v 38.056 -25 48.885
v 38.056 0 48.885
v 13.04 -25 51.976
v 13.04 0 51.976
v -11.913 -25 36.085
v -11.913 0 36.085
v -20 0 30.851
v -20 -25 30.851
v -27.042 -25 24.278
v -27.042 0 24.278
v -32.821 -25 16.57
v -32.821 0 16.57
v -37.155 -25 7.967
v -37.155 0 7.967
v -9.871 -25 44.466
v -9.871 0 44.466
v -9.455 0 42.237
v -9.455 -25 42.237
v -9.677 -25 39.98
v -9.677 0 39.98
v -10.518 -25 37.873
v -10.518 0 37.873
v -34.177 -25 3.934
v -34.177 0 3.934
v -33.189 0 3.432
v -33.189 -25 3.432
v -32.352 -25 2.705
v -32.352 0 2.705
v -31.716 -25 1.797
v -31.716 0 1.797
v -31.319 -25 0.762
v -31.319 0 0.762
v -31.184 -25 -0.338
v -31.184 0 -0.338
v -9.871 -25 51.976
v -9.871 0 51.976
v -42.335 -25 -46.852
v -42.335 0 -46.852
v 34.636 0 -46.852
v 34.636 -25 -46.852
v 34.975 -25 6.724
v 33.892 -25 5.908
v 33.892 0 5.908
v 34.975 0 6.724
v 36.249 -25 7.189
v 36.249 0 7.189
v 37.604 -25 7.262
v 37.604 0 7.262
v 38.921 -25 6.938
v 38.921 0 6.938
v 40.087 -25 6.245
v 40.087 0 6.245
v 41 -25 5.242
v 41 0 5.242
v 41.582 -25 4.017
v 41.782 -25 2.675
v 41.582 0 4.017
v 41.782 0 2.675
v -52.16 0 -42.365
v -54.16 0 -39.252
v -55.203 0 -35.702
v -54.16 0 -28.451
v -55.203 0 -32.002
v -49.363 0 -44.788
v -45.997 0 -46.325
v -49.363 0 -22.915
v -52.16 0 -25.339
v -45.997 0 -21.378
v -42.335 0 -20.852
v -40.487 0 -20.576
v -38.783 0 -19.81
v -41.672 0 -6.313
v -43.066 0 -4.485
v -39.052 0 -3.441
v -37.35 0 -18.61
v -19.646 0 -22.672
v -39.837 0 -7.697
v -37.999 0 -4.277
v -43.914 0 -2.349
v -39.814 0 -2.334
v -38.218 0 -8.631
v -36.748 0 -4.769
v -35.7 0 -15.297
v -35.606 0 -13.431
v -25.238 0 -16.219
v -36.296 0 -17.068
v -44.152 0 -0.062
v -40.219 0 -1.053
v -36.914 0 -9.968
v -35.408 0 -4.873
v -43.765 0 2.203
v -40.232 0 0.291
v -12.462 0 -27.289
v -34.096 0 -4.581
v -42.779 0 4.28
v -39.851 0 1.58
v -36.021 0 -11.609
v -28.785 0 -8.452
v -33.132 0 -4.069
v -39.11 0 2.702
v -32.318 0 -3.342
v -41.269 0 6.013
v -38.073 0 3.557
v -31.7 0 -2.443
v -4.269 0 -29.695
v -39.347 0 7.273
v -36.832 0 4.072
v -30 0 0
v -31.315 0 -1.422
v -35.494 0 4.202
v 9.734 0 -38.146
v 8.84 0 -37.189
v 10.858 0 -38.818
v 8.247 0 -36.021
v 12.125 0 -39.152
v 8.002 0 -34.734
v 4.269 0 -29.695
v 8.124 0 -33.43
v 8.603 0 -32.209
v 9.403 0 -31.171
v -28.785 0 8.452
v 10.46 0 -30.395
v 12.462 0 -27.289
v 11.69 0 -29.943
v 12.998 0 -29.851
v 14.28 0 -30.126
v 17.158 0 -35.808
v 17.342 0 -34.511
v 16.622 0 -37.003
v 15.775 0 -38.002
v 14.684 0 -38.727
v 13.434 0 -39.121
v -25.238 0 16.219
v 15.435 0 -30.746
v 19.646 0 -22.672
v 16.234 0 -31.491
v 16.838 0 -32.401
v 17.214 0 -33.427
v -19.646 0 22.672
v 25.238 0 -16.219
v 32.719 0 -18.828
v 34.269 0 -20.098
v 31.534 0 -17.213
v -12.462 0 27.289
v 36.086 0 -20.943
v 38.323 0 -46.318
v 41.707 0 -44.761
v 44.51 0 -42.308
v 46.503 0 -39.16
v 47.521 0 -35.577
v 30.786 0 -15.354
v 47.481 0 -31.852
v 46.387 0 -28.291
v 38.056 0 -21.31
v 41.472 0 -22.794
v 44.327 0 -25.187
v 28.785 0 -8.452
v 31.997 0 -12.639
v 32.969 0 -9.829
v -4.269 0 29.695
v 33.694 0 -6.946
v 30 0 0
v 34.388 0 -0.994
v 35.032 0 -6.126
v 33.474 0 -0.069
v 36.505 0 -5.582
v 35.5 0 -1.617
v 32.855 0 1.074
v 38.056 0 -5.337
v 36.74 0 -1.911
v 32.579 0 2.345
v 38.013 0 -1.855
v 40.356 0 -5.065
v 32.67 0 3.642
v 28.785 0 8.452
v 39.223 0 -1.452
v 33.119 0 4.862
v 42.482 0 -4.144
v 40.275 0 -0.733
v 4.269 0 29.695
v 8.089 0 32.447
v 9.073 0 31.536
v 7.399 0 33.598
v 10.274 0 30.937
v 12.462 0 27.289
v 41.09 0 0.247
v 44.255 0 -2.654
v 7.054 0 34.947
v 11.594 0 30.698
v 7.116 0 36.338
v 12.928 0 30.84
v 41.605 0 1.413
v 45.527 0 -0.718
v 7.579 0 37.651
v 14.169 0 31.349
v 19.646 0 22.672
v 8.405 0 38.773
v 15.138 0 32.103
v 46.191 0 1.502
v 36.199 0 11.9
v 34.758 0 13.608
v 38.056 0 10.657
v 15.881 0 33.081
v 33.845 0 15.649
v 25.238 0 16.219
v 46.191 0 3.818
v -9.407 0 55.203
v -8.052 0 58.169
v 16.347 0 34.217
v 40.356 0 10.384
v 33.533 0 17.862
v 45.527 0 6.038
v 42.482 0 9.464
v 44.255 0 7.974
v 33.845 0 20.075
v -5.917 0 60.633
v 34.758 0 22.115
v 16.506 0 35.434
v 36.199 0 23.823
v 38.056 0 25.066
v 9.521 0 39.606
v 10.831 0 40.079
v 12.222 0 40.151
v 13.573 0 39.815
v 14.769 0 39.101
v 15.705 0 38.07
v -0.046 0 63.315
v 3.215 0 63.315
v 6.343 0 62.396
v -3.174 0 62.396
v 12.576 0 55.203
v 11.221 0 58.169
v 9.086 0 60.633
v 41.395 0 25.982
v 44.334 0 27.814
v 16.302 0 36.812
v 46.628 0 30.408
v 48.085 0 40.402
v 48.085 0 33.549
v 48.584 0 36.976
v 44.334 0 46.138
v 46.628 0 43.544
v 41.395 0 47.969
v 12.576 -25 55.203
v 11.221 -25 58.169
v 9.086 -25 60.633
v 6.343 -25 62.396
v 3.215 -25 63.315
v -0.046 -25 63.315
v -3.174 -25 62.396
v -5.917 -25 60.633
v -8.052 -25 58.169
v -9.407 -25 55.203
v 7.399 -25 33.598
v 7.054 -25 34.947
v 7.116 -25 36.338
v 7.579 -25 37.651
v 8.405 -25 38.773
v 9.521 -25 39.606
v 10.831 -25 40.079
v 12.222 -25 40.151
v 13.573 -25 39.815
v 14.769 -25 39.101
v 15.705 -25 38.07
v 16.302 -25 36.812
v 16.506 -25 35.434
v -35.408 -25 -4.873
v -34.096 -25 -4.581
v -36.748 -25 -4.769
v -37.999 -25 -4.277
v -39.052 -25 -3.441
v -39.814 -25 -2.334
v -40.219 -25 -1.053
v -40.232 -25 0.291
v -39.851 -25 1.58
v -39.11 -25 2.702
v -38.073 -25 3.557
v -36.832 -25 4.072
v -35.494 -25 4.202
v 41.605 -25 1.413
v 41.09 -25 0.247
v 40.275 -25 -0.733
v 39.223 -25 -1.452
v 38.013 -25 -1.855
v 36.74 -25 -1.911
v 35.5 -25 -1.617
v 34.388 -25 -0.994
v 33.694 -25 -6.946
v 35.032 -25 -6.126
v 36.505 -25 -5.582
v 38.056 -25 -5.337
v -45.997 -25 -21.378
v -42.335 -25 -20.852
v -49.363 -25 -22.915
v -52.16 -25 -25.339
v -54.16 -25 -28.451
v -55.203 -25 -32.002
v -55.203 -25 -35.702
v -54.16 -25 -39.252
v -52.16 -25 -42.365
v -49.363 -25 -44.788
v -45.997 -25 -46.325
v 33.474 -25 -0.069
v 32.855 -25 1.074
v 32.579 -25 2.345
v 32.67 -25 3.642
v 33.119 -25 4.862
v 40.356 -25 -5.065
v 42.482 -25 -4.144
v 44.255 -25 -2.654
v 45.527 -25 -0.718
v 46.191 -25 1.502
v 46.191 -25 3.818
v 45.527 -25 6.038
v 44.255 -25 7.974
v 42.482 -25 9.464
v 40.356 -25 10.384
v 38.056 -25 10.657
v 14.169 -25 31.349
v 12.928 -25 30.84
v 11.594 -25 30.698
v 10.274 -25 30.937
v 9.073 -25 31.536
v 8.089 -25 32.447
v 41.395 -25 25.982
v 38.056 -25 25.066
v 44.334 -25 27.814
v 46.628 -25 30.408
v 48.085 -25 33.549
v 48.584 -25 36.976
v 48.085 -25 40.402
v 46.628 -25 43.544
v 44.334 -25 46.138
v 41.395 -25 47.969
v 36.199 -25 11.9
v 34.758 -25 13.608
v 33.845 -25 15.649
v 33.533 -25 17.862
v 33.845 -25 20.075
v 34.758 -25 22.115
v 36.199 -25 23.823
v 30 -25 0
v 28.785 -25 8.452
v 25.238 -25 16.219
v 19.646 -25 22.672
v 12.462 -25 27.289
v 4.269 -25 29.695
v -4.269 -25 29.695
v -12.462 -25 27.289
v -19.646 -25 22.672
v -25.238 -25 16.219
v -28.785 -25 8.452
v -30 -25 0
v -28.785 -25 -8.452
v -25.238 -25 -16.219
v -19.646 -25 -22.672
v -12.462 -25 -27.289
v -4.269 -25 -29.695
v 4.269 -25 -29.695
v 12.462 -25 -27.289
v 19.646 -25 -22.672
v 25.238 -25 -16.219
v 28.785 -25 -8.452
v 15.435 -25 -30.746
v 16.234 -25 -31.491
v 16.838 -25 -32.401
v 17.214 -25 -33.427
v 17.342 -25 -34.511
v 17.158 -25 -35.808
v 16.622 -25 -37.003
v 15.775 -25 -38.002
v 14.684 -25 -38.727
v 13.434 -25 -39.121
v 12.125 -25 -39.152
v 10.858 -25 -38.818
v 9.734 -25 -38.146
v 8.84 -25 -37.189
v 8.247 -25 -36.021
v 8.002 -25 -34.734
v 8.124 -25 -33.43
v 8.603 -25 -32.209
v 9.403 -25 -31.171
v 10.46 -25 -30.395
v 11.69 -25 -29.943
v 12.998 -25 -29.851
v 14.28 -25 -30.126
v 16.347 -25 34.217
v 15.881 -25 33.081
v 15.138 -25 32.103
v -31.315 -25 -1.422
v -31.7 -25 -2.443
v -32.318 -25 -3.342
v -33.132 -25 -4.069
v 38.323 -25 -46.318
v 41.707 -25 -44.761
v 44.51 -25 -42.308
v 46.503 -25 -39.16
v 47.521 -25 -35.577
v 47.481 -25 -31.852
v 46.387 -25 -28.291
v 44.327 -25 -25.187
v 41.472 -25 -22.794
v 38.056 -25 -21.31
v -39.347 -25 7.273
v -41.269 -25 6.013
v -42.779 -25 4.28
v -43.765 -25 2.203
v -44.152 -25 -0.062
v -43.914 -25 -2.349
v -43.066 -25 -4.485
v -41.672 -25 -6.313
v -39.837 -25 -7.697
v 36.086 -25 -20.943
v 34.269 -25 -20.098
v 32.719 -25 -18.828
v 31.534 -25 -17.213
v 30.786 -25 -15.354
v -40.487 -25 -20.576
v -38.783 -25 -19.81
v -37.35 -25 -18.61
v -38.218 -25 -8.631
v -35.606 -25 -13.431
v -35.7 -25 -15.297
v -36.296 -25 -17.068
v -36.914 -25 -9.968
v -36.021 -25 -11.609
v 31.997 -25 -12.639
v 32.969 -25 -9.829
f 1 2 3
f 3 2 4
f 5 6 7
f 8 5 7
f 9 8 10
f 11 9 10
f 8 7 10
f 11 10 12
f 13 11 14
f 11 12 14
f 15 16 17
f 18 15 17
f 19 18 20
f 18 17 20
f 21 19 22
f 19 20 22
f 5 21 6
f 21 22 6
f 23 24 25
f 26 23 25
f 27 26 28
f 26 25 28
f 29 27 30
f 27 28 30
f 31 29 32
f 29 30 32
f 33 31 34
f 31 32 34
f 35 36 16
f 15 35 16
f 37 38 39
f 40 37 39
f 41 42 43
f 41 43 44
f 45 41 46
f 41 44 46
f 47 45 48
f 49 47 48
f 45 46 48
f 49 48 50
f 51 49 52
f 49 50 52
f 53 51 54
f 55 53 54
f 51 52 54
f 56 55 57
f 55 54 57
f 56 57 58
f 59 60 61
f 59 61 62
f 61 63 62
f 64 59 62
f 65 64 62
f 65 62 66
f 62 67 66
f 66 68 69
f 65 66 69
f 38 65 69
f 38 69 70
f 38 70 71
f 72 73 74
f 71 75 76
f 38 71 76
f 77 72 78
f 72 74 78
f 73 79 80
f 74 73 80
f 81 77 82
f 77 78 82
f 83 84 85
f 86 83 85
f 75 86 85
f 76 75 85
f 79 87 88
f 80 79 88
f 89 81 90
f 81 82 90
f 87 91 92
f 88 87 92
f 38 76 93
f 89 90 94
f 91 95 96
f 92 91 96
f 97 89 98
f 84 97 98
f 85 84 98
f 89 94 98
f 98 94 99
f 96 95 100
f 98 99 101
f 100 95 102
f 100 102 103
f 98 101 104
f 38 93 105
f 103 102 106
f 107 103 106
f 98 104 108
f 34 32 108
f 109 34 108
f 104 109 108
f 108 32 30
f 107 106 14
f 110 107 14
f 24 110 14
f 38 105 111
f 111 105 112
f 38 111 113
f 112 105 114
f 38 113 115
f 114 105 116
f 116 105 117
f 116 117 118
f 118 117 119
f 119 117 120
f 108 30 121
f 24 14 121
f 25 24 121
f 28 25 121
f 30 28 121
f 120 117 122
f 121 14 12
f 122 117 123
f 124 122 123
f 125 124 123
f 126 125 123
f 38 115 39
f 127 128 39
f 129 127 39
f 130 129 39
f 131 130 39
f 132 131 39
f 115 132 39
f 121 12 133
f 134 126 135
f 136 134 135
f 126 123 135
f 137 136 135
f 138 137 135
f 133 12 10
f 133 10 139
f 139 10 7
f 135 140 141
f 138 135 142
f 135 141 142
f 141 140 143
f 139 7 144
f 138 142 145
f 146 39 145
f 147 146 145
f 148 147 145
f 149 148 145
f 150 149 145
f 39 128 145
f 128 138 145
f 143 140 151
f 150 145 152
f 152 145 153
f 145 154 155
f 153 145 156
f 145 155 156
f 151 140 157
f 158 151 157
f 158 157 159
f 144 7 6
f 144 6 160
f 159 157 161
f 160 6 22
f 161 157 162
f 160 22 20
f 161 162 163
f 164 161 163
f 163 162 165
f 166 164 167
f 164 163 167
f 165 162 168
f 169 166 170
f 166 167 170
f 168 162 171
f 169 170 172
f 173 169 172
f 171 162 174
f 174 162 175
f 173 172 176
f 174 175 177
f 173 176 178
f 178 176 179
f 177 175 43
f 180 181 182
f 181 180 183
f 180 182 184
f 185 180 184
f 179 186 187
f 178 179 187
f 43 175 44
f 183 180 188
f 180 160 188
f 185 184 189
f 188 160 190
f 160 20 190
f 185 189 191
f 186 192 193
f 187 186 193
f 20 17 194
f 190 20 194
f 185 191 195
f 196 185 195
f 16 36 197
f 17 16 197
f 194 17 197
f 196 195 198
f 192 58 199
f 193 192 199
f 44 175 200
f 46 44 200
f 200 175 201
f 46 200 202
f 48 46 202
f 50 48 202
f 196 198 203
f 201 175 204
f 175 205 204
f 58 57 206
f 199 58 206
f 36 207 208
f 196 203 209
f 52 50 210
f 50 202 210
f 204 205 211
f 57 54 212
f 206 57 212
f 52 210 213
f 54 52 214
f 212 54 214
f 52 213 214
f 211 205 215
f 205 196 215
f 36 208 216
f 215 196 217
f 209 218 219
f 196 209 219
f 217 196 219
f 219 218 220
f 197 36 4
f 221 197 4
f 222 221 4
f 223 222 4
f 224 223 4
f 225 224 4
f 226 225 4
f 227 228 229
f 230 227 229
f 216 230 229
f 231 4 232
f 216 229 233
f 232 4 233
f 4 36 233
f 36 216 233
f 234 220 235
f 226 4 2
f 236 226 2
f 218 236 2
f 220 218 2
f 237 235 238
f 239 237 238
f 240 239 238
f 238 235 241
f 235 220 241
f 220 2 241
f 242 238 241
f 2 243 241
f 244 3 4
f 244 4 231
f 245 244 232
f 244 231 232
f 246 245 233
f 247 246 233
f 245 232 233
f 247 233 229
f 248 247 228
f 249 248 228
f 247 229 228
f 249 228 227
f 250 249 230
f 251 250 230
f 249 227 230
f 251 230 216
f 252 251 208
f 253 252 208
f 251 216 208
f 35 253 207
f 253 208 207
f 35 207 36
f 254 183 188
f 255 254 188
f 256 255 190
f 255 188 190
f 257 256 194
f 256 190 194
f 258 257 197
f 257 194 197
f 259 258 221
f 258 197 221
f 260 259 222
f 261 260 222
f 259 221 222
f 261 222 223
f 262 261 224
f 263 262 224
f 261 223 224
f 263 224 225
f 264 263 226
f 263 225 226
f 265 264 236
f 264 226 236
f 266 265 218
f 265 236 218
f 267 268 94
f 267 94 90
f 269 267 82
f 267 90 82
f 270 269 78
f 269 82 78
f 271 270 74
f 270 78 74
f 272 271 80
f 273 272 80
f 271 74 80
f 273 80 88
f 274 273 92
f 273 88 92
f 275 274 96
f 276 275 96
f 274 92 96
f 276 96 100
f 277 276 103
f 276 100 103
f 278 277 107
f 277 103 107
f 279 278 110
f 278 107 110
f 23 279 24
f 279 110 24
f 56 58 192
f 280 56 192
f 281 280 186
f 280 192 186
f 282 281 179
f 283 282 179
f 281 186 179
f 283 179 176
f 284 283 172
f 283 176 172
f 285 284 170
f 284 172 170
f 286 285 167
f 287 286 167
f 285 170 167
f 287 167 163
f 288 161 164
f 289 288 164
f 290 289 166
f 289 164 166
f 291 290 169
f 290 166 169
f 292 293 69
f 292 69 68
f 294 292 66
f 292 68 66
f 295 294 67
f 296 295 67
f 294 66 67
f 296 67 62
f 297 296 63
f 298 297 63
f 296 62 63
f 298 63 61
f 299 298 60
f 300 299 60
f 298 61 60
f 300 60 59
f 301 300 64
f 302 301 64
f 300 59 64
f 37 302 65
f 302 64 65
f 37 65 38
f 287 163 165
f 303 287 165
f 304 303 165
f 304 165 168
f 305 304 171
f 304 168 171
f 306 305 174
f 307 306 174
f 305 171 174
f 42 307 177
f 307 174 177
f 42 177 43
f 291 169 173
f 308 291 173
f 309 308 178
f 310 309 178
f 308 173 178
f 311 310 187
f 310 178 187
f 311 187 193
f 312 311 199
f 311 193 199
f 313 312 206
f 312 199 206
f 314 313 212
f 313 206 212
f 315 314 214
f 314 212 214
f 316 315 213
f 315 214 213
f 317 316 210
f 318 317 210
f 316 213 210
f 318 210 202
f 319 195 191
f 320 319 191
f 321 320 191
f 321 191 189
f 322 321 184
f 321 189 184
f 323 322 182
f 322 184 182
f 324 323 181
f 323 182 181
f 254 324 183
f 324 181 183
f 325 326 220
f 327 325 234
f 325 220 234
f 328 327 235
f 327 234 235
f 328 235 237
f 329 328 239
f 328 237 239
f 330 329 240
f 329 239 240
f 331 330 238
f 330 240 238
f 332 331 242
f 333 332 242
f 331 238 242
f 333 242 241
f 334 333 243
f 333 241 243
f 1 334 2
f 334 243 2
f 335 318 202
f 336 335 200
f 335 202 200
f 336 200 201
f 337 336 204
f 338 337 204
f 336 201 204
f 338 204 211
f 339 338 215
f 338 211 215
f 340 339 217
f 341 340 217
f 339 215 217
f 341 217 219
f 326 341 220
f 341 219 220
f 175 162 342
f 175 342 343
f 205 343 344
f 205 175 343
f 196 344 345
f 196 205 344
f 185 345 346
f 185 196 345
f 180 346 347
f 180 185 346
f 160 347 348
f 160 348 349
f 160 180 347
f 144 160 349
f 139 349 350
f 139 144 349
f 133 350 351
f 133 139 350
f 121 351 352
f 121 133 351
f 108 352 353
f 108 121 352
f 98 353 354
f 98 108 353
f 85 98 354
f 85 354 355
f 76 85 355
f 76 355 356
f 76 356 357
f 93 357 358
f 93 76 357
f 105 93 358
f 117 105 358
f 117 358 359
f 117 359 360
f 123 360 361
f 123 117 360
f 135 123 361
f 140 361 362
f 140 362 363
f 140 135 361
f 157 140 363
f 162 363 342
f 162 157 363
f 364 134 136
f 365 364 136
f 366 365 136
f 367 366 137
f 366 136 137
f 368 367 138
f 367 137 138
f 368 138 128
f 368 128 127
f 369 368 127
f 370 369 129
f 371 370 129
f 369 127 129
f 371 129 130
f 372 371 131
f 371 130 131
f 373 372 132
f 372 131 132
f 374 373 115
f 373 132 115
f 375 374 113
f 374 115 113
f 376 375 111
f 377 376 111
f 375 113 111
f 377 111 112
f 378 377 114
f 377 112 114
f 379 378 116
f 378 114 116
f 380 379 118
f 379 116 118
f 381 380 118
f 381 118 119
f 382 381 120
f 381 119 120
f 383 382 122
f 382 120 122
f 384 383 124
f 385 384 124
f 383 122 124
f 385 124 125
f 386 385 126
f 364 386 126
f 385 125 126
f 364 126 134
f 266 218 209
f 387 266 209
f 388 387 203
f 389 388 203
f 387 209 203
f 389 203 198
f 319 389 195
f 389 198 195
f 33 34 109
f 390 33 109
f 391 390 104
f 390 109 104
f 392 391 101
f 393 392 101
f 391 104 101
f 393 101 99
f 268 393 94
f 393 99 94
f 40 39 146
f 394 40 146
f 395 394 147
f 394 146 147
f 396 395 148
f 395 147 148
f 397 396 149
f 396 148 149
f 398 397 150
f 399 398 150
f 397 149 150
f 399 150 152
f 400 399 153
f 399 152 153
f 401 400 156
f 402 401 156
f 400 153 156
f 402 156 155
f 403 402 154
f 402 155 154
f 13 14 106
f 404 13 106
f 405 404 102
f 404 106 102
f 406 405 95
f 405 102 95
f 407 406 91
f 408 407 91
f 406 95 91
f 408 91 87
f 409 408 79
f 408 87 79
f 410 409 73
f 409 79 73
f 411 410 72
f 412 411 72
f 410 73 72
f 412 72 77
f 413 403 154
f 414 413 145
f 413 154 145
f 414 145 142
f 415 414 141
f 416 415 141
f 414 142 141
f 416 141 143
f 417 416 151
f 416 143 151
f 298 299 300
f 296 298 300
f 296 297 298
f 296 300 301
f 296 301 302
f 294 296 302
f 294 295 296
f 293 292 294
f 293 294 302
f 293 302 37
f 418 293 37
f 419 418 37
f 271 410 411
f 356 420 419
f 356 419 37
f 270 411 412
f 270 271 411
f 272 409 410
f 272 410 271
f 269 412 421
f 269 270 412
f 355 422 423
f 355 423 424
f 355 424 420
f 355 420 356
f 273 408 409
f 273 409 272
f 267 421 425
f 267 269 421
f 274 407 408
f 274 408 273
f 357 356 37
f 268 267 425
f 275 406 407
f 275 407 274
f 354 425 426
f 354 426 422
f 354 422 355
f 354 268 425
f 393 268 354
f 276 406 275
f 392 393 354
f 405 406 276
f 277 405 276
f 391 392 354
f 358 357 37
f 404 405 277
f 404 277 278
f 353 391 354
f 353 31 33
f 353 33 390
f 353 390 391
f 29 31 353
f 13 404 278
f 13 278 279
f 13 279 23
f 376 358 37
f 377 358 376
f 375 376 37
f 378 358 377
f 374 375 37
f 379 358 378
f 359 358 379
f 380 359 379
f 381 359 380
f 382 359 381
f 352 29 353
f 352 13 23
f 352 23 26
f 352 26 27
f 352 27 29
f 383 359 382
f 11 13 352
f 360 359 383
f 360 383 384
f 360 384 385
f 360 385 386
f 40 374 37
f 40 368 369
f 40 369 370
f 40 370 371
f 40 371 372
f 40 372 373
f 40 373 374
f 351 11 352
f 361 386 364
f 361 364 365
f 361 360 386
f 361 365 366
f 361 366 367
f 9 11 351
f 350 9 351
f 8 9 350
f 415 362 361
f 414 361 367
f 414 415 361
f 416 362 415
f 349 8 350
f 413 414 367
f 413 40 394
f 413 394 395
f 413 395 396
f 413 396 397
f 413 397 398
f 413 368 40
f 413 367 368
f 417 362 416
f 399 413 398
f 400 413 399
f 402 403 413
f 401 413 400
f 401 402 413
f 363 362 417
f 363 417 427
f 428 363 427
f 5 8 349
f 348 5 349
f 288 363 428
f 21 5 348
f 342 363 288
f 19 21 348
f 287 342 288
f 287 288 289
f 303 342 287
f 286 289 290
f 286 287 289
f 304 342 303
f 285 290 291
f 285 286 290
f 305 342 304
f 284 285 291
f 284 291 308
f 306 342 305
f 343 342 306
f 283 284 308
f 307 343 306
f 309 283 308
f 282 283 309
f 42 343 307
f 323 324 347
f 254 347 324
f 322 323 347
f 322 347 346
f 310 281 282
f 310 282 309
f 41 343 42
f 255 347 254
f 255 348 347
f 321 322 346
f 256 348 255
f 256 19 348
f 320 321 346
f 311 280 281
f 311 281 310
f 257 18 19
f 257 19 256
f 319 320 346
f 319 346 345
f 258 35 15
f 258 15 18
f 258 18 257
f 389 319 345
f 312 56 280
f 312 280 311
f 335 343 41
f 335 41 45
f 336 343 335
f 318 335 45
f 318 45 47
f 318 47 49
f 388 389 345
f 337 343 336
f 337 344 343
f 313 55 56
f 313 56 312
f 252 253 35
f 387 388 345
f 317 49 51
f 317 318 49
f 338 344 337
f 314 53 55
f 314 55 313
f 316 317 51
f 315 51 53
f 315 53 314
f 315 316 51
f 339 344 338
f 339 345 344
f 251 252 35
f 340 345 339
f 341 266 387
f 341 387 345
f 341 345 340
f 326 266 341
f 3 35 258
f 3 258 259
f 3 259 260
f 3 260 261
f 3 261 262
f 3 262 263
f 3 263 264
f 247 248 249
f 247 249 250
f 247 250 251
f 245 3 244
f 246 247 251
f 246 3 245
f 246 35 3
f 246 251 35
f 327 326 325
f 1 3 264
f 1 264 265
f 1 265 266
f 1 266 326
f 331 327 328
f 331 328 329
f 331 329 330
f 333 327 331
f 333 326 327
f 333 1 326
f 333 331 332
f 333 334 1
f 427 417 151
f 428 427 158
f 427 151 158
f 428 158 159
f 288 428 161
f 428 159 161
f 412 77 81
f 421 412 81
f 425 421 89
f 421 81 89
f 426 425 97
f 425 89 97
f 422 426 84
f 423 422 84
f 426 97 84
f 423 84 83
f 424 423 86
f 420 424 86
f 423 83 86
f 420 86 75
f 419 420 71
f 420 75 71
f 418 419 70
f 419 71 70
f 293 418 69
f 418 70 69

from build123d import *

# Parameters (mm, degrees)
F0_R     = 30
F1_DEPTH = 25


with BuildPart() as f1:
    # F0 (on Front) → F1 (new body)
    with BuildSketch(Plane.XZ):
        with BuildLine():
            ThreePointArc((-9.8709988717, 44.4664797866), (-9.6765479631, 39.9795085396), (-11.9125396102, 36.0845035997))
            ThreePointArc((-11.9125396102, 36.0845035997), (-27.0421470159, 24.2777678435), (-37.1553505028, 7.9674292602))
            ThreePointArc((-37.1553505028, 7.9674292602), (-44.036048411, 1.0836405197), (-39.8366623459, -7.6967756324))
            ThreePointArc((-39.8366623459, -7.6967756324), (-35.6999774991, -15.297082174), (-42.3349477351, -20.8517190672))
            ThreePointArc((-42.3349477351, -20.8517190672), (-55.3349477351, -33.8517190672), (-42.3349477351, -46.8517190672))
            Line((-42.3349477351, -46.8517190672), (34.6360049196, -46.8517190672))
            ThreePointArc((34.6360049196, -46.8517190672), (47.5210264522, -35.5768915526), (38.0558333228, -21.3095990832))
            ThreePointArc((38.0558333228, -21.3095990832), (33.4543868939, -19.5118063183), (30.786217704, -15.3541337437))
            ThreePointArc((30.786217704, -15.3541337437), (24.3583291, -24.2942879499), (15.4351278274, -30.7456899823))
            ThreePointArc((15.4351278274, -30.7456899823), (16.8378076077, -32.4009903223), (17.3415790067, -34.5113798976))
            ThreePointArc((17.3415790067, -34.5113798976), (12.1247193284, -39.1518231188), (8.1239473631, -33.4296590287))
            ThreePointArc((8.1239473631, -33.4296590287), (-19.4089792265, -28.4047909501), (-34.0963191618, -4.5805723603))
            ThreePointArc((-34.0963191618, -4.5805723603), (-40.2756080675, -0.3812017982), (-34.1769117208, 3.9343778115))
            ThreePointArc((-34.1769117208, 3.9343778115), (-19.9809519782, 28.0053955797), (7.3990994056, 33.5975289496))
            ThreePointArc((7.3990994056, 33.5975289496), (10.830759038, 40.0793765069), (16.5063219502, 35.4340970516))
            ThreePointArc((16.5063219502, 35.4340970516), (15.8808188237, 33.0810127965), (14.1694376368, 31.3491253561))
            ThreePointArc((14.1694376368, 31.3491253561), (27.1897380489, 21.0774469129), (33.8915853443, 5.9077124496))
            ThreePointArc((33.8915853443, 5.9077124496), (38.9210173699, 6.9384879734), (41.7815475753, 2.6752671693))
            ThreePointArc((41.7815475753, 2.6752671693), (39.2225245159, -1.4515862058), (34.38826426, -0.9939339614))
            ThreePointArc((34.38826426, -0.9939339614), (34.1710361171, -3.985086476), (33.6941290984, -6.9459547822))
            ThreePointArc((33.6941290984, -6.9459547822), (35.7555321816, -5.8176755547), (38.0558333228, -5.3370391578))
            ThreePointArc((38.0558333228, -5.3370391578), (46.2747957775, 2.659963746), (38.0558333228, 10.6569666498))
            ThreePointArc((38.0558333228, 10.6569666498), (33.5332006387, 17.8616815332), (38.0558333228, 25.0663964165))
            ThreePointArc((38.0558333228, 25.0663964165), (48.5844980046, 36.975853683), (38.0558333228, 48.8853109494))
            Line((38.0558333228, 48.8853109494), (13.0399948809, 51.975853683))
            ThreePointArc((13.0399948809, 51.975853683), (1.5844980046, 63.4313505593), (-9.8709988717, 51.975853683))
            Line((-9.8709988717, 51.975853683), (-9.8709988717, 44.4664797866))
        make_face()
        with BuildLine():
            ThreePointArc((15.4351278274, -30.7456899823), (24.3583291, -24.2942879499), (30.786217704, -15.3541337437))
            ThreePointArc((30.786217704, -15.3541337437), (30.9635483069, -10.7085321739), (33.6941290984, -6.9459547822))
            ThreePointArc((33.6941290984, -6.9459547822), (34.1710361171, -3.985086476), (34.38826426, -0.9939339614))
            ThreePointArc((34.38826426, -0.9939339614), (32.5791661443, 2.3445688104), (33.8915853443, 5.9077124496))
            ThreePointArc((33.8915853443, 5.9077124496), (27.1897380489, 21.0774469129), (14.1694376368, 31.3491253561))
            ThreePointArc((14.1694376368, 31.3491253561), (10.2739993221, 30.9368169475), (7.3990994056, 33.5975289496))
            ThreePointArc((7.3990994056, 33.5975289496), (-19.9809519782, 28.0053955797), (-34.1769117208, 3.9343778115))
            ThreePointArc((-34.1769117208, 3.9343778115), (-32.0065217205, 2.2701500151), (-31.1837948135, -0.3381765267))
            ThreePointArc((-31.1837948135, -0.3381765267), (-31.9820022181, -2.9111475958), (-34.0963191618, -4.5805723603))
            ThreePointArc((-34.0963191618, -4.5805723603), (-19.4089792265, -28.4047909501), (8.1239473631, -33.4296590287))
            ThreePointArc((8.1239473631, -33.4296590287), (11.0591409817, -30.1253010368), (15.4351278274, -30.7456899823))
        make_face()
        Circle(F0_R, mode=Mode.SUBTRACT)
        with BuildLine():
            ThreePointArc((33.6941290984, -6.9459547822), (30.9635483069, -10.7085321739), (30.786217704, -15.3541337437))
            ThreePointArc((30.786217704, -15.3541337437), (32.5131227245, -11.2444419264), (33.6941290984, -6.9459547822))
        make_face()
    extrude(amount=F1_DEPTH)


solid = f1.part
